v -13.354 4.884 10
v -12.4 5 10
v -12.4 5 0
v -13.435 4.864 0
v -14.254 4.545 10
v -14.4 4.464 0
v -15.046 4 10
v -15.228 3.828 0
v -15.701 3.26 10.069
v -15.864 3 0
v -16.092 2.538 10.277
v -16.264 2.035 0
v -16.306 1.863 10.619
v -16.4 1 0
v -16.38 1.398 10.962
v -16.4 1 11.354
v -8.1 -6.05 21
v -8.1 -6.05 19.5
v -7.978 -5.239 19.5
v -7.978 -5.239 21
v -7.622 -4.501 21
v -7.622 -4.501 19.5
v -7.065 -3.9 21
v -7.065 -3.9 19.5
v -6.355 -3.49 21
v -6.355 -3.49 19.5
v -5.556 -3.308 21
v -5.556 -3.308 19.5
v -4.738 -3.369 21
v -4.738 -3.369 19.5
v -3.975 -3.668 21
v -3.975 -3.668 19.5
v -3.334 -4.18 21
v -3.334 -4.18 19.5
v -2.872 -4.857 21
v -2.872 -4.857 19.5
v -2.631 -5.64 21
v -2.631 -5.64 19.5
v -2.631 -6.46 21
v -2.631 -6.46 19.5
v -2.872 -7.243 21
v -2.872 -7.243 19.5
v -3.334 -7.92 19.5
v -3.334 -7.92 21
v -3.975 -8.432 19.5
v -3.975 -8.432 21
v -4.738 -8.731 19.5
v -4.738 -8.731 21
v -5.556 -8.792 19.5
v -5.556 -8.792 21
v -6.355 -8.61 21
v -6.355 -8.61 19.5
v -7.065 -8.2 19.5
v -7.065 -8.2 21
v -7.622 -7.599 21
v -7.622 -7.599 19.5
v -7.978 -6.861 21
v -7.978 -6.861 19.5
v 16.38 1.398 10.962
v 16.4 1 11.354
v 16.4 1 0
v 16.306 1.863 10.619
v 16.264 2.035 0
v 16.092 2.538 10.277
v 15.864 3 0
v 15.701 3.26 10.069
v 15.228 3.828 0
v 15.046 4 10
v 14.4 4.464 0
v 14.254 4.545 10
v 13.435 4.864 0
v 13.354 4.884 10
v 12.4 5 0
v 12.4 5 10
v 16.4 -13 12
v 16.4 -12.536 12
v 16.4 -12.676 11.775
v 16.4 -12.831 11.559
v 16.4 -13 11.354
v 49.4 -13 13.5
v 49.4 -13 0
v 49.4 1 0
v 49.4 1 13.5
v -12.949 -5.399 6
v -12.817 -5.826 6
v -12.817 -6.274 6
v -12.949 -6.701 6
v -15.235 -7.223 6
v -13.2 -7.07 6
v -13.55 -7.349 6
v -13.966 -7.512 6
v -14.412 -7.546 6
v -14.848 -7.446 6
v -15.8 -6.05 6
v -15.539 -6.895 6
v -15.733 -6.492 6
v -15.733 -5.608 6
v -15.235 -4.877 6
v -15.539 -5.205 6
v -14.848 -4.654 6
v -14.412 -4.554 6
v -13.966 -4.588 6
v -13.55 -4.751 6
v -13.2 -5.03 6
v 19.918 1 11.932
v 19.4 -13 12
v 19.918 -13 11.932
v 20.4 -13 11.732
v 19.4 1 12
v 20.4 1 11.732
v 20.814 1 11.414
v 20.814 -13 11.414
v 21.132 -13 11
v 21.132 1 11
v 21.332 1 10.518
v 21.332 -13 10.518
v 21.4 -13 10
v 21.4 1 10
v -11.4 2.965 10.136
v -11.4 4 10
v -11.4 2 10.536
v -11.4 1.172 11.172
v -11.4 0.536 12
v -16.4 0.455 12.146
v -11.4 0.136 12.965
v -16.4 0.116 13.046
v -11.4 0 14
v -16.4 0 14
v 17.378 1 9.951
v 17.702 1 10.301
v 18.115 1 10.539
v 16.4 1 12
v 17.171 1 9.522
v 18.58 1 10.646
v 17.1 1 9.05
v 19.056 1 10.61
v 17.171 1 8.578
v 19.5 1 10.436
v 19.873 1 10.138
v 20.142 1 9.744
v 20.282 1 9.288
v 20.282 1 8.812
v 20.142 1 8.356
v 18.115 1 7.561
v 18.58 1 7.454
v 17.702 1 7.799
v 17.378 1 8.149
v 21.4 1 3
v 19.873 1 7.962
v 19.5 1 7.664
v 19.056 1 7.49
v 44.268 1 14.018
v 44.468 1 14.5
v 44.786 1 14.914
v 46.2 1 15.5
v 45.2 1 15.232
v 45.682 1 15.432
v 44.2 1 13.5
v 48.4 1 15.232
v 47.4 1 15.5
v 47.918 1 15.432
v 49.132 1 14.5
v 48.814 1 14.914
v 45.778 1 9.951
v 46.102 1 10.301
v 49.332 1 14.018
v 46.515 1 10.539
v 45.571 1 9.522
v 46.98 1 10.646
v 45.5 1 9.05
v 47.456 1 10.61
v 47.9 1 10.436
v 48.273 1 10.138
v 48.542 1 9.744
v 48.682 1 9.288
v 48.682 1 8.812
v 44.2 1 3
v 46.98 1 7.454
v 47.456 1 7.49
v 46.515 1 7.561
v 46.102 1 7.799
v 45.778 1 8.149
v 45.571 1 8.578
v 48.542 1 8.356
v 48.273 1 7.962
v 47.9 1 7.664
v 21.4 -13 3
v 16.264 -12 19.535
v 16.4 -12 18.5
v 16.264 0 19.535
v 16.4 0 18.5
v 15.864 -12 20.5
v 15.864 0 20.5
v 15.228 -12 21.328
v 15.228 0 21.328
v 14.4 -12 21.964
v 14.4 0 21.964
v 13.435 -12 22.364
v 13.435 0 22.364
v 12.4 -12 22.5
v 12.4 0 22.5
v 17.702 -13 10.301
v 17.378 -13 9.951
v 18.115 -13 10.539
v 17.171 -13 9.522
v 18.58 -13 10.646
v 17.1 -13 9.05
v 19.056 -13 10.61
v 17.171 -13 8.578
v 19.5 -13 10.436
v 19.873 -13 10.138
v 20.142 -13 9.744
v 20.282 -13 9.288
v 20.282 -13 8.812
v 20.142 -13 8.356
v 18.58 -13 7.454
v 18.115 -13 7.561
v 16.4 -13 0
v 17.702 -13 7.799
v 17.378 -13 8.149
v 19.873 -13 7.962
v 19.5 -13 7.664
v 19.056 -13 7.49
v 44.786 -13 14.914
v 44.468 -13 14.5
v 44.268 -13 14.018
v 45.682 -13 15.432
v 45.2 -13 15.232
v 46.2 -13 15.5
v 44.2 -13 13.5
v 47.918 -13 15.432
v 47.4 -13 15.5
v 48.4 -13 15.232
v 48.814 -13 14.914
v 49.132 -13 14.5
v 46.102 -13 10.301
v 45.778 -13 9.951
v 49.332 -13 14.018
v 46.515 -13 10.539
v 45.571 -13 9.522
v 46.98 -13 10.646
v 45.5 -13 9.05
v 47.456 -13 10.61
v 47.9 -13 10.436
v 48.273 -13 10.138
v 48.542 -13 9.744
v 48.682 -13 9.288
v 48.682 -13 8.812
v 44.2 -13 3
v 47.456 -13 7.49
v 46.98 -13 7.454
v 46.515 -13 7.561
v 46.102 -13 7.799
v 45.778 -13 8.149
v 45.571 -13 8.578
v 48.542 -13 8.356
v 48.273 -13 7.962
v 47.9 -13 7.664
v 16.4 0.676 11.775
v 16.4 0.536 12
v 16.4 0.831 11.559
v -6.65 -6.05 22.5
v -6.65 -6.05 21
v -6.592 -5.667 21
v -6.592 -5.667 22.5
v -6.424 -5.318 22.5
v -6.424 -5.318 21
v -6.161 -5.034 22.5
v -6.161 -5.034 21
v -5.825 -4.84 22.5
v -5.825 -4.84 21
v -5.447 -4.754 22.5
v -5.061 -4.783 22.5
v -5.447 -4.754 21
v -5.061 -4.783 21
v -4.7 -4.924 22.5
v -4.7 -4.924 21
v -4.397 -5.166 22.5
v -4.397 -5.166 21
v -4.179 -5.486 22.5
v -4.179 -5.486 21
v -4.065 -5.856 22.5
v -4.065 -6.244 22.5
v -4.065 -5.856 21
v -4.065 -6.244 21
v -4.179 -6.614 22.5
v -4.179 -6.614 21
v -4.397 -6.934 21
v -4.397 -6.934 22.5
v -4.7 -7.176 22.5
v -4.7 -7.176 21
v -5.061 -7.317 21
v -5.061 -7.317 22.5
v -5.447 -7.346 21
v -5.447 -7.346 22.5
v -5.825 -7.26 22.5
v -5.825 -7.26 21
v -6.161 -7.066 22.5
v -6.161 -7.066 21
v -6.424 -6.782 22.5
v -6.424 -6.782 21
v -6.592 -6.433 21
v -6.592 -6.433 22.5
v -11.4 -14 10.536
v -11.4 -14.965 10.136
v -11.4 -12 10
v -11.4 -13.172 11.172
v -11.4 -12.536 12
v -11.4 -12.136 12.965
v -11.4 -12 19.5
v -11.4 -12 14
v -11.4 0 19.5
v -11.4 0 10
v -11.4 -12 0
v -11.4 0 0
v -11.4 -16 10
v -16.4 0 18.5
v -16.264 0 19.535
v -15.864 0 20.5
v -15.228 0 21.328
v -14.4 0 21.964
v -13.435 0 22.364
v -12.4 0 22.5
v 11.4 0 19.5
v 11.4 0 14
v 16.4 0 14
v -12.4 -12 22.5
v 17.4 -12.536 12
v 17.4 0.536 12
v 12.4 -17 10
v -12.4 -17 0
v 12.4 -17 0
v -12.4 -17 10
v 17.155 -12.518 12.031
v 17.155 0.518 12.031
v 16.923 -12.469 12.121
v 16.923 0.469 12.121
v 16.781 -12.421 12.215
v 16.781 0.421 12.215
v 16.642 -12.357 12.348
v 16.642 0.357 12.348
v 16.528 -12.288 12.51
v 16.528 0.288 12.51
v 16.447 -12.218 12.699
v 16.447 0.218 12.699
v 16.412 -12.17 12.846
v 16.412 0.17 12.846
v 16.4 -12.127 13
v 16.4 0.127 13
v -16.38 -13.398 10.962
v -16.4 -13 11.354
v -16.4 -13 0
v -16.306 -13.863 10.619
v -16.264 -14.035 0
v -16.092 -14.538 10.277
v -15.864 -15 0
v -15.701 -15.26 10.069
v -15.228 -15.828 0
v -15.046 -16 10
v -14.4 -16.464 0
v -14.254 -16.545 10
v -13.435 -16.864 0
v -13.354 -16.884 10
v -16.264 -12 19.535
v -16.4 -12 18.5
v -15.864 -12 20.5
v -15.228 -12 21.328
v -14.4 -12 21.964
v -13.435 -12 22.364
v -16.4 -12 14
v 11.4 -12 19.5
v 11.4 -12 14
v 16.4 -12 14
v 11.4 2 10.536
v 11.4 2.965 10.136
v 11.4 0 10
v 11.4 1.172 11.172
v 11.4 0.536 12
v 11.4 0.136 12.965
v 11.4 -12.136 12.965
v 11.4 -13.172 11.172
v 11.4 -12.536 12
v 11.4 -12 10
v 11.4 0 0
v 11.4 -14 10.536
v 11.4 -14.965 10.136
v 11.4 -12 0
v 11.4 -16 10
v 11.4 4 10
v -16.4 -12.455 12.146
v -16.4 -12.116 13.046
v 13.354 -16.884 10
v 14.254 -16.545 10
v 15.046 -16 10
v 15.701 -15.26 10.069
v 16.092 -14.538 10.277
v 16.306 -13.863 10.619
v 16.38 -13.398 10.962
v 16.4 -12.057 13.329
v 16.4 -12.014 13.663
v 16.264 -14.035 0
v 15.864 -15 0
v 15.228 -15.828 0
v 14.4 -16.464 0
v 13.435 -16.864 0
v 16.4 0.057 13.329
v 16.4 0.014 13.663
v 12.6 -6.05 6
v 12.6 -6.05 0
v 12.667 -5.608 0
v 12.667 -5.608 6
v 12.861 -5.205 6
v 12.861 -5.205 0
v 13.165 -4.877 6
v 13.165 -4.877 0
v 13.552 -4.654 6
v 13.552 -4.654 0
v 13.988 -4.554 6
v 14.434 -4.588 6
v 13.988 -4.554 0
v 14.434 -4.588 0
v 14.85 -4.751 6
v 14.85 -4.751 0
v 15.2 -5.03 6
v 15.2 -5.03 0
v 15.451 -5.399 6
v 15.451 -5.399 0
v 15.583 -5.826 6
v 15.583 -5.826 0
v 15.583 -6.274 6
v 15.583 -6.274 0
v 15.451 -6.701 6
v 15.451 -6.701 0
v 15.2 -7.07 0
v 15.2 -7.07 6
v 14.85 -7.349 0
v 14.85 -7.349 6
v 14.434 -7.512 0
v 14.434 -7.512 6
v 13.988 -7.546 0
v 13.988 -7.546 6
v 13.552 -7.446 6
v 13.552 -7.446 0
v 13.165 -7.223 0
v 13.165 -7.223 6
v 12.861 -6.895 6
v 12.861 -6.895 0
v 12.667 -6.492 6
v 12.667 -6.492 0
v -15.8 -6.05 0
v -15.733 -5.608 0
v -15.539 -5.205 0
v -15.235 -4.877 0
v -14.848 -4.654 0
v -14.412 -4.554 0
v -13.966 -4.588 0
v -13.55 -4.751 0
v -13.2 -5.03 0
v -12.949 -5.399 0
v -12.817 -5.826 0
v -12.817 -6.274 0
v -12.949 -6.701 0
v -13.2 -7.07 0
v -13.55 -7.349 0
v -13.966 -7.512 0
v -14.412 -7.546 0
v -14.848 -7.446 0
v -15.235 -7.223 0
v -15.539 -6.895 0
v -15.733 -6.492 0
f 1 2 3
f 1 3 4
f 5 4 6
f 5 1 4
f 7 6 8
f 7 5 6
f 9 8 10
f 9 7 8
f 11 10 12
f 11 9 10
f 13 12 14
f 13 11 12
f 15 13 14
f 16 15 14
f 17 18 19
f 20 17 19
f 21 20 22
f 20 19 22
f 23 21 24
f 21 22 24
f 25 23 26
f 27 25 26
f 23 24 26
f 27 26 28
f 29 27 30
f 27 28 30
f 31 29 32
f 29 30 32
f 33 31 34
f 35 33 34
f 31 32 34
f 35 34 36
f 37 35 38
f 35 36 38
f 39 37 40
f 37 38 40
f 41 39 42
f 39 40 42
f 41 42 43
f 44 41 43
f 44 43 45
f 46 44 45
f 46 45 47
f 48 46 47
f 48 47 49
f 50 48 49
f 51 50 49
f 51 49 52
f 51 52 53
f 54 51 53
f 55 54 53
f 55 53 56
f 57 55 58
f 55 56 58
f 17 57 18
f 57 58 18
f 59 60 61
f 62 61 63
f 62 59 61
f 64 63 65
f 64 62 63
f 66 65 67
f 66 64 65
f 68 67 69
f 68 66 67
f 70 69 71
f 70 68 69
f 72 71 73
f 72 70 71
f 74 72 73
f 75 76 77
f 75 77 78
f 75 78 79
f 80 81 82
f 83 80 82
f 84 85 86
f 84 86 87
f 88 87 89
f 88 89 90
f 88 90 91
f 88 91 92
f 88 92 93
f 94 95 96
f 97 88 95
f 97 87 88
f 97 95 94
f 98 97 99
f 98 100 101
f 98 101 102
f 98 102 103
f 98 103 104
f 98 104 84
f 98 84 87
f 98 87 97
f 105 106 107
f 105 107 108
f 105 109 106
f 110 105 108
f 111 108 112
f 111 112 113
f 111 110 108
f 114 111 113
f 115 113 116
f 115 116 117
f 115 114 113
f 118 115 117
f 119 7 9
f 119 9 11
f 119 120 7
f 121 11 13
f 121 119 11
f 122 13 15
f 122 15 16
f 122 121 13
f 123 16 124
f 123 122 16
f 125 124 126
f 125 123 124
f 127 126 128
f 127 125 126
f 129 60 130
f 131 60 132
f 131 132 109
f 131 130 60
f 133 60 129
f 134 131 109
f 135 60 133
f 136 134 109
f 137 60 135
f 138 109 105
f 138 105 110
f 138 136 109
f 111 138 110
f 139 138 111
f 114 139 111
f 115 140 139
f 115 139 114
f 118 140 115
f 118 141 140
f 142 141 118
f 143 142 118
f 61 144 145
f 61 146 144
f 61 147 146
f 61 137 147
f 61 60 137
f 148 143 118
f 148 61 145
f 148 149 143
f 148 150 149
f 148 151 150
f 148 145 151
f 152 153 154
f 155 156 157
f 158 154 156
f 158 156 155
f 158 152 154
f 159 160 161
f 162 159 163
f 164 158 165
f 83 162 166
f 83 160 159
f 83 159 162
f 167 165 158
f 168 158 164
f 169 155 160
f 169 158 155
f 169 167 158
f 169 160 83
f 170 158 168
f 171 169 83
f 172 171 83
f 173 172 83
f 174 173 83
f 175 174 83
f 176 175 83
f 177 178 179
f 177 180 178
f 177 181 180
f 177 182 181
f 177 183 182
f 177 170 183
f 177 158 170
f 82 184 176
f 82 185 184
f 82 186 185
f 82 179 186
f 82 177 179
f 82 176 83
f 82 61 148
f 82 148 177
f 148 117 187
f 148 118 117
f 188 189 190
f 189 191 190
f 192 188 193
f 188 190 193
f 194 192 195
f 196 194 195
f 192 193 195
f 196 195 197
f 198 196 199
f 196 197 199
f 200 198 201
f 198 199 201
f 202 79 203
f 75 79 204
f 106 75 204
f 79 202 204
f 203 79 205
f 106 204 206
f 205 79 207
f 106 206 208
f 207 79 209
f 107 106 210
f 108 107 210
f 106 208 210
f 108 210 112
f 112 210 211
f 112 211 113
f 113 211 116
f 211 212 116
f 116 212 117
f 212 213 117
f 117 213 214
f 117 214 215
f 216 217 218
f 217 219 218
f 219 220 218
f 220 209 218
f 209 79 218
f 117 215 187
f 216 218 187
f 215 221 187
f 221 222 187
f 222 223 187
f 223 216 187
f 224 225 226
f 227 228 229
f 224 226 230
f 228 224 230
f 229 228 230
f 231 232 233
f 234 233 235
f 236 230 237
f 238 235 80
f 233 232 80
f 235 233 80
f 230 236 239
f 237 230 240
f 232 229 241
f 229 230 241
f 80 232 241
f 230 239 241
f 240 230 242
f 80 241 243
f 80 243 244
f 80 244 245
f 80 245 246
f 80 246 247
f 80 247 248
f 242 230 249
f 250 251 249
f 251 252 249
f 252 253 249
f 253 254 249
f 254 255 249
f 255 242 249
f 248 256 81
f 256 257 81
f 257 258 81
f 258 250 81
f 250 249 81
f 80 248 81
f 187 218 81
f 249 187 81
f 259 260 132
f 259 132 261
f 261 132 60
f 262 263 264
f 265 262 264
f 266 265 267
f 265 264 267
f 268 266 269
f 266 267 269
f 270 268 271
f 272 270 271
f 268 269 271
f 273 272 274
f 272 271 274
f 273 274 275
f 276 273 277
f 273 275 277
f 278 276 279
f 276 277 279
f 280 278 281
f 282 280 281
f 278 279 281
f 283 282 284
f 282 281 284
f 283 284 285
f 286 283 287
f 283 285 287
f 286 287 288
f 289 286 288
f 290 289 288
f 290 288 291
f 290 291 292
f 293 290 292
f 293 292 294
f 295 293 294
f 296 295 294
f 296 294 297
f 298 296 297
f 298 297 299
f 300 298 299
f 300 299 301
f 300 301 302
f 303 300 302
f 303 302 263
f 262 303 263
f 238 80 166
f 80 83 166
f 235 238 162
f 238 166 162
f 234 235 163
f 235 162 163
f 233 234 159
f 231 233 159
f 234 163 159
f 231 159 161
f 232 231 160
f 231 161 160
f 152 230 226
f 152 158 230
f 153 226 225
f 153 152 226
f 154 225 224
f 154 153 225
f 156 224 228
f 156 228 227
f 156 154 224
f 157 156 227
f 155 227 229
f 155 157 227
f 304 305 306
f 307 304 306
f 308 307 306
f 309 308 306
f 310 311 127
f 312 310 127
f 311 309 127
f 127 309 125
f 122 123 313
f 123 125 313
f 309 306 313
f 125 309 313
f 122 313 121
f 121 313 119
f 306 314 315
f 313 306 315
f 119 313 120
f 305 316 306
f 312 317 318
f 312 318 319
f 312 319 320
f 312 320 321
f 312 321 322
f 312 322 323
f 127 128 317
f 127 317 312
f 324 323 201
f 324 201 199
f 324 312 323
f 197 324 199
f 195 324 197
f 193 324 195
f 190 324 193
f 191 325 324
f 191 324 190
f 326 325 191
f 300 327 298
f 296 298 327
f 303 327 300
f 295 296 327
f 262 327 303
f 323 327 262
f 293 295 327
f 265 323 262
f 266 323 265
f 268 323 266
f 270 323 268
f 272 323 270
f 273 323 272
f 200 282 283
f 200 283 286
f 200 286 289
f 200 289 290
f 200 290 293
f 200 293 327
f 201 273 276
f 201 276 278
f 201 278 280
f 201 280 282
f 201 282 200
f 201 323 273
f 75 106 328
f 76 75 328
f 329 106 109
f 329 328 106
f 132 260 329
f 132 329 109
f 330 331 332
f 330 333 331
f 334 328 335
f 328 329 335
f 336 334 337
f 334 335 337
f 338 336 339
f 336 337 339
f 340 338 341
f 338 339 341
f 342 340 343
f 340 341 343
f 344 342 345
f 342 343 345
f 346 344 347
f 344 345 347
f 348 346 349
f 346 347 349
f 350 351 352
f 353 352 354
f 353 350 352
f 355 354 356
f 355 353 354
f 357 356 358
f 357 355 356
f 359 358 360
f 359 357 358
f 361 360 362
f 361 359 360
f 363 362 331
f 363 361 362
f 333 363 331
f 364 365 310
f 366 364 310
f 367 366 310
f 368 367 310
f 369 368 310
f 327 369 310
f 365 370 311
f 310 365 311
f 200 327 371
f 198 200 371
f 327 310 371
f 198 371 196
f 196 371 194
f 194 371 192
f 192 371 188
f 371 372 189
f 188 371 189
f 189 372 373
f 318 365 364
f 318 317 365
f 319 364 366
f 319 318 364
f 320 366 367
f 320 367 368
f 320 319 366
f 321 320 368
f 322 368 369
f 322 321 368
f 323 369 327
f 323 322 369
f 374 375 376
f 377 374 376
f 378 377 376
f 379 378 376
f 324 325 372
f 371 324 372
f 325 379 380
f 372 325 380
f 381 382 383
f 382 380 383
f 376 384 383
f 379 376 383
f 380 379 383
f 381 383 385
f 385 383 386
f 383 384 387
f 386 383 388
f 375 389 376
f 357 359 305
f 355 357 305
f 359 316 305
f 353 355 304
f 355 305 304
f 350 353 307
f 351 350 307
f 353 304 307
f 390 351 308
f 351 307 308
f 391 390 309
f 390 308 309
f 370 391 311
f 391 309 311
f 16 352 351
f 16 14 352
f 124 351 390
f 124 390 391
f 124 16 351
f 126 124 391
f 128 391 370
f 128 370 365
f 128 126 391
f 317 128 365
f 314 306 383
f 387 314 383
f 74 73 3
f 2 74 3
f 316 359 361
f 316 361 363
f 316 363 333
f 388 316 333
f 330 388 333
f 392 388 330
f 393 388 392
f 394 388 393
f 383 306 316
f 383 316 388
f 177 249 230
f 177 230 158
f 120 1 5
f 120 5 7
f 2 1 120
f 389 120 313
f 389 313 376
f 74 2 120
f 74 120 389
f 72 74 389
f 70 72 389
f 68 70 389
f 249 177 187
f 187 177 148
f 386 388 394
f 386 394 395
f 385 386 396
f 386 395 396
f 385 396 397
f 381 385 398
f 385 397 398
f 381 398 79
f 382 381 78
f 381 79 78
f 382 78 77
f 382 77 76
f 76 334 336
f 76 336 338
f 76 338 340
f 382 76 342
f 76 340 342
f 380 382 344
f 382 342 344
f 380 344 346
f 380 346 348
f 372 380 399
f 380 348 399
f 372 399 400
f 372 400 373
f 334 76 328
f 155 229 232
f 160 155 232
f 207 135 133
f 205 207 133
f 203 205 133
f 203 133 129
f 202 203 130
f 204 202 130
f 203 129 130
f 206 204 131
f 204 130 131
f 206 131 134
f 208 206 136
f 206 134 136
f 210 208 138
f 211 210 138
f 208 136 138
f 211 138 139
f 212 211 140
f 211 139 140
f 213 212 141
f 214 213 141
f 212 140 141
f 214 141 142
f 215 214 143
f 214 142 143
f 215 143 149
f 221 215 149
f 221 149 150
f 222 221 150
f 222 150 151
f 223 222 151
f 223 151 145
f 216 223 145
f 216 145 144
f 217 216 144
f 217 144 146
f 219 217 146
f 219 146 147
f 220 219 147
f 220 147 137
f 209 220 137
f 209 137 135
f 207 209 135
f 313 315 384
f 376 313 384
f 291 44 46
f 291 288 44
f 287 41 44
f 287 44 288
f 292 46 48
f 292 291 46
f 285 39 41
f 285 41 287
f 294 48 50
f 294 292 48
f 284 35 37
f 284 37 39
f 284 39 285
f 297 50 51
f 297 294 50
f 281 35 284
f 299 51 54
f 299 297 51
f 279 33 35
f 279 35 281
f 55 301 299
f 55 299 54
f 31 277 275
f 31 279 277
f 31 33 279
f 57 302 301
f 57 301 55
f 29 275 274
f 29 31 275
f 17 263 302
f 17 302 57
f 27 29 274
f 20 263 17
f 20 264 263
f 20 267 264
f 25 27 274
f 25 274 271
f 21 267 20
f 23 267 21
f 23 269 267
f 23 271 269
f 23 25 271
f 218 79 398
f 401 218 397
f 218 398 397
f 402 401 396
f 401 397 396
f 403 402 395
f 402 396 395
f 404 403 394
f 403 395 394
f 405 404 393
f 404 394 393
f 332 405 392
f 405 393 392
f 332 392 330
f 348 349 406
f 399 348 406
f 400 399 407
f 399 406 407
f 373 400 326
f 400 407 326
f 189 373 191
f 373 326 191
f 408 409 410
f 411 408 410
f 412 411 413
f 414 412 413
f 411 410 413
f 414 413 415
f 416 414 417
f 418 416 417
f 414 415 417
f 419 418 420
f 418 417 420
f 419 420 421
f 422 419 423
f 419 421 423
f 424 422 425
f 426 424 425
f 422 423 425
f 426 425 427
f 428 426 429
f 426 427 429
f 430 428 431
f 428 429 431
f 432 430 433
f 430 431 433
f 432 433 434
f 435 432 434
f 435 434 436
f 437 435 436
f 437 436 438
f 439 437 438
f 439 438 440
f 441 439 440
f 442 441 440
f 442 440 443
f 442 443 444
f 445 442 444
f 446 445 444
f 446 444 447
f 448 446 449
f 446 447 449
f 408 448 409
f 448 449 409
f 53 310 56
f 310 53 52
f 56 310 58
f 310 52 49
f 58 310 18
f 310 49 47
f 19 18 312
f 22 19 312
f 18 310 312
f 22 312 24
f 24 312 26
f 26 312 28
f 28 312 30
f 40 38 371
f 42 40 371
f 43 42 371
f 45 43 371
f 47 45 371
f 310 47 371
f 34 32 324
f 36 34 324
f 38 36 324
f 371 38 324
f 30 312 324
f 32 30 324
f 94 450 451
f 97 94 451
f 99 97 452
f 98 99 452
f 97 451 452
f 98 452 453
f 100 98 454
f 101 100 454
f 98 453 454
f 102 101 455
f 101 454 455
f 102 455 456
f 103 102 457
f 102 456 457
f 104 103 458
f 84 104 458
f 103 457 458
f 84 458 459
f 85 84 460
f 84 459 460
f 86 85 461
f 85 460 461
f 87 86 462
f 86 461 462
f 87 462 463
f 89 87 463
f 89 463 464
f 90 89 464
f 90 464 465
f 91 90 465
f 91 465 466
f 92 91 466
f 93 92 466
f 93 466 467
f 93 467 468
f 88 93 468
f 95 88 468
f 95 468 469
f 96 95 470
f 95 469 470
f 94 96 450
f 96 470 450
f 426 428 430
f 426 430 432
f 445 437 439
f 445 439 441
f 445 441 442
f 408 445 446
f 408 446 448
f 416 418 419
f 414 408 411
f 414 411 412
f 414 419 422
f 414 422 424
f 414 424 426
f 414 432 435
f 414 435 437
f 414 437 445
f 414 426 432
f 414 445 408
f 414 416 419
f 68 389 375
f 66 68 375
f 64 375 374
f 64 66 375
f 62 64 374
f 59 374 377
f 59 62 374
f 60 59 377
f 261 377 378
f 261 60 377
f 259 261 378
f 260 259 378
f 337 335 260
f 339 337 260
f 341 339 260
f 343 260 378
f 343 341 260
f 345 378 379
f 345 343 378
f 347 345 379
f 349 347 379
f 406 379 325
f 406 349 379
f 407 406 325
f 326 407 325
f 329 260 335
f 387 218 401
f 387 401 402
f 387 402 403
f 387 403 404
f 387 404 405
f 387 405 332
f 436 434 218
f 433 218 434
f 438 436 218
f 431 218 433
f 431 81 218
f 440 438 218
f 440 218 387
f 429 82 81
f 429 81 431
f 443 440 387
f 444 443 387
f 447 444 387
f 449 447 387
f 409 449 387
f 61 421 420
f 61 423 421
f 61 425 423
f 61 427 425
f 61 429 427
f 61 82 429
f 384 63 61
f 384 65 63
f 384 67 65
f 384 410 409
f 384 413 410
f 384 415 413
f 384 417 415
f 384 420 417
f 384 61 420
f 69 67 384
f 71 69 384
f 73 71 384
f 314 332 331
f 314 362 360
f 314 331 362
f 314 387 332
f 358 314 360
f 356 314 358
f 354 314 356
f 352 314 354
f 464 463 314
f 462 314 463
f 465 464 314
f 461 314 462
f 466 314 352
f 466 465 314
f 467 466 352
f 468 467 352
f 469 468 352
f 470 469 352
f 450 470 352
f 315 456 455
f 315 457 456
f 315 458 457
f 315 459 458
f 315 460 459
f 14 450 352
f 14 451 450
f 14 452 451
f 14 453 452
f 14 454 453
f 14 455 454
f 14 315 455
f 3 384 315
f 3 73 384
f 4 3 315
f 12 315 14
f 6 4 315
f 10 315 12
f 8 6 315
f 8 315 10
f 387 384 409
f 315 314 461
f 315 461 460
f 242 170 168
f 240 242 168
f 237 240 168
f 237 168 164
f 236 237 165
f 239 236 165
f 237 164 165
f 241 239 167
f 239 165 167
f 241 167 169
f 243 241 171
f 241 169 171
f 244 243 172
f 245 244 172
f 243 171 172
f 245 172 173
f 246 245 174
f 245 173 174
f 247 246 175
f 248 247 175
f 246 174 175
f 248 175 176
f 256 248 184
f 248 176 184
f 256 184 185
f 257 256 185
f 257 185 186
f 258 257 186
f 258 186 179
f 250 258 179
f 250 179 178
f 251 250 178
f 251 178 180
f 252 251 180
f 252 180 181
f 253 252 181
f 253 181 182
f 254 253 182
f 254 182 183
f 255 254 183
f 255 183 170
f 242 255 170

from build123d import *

# Parameters (mm, degrees)
EXTRUDE_THIN1_DEPTH = 10
FILLET1_R           = 4
SKETCH2_W           = 5
SKETCH2_H           = 12
BOSS_EXTRUDE1_DEPTH = 9.5
SKETCH3_W           = 32.8
SKETCH3_H           = 12
BOSS_EXTRUDE2_DEPTH = 3
FILLET2_R           = 4
SKETCH4_R           = 1.3
CUT_EXTRUDE1_DEPTH  = 3
SKETCH5_R           = 1.5
CUT_EXTRUDE2_DEPTH  = 6
SKETCH6_W           = 32.8
SKETCH6_H           = 10
BOSS_EXTRUDE3_DEPTH = 5
FILLET3_R           = 4
FILLET4_R           = 4
SKETCH7_R           = 2.75
CUT_EXTRUDE3_DEPTH  = 1.5
SKETCH9_W           = 9
SKETCH9_H           = 14
BOSS_EXTRUDE5_DEPTH = 5
FILLET10_R          = 1
SKETCH12_W          = 33
SKETCH12_H          = 14
BOSS_EXTRUDE7_DEPTH = 3
SKETCH13_W          = 5.2
SKETCH13_H          = 14
BOSS_EXTRUDE8_DEPTH = 12.5
FILLET11_R          = 2
FILLET13_R          = 2
SKETCH14_R          = 1.6
CUT_EXTRUDE4_DEPTH  = 58.189247273


with BuildPart() as part:
    # Sketch1 → Extrude-Thin1 (new body)
    with BuildSketch(Plane.XY):
        Polygon((-11.4, -12), (-11.4, 0), (11.4, 0), (11.4, -12), (16.4, -12), (16.4, 5), (-16.4, 5), (-16.4, -12), align=None)
    extrude(amount=EXTRUDE_THIN1_DEPTH)

    # Fillet1
    fillet1_edges = [part.edges().sort_by_distance(p)[0] for p in [
        (-16.4, 5, 5),
        (16.4, 5, 5),
    ]]
    fillet(fillet1_edges, radius=FILLET1_R)

    # Sketch2 → Boss-Extrude1 (add)
    with BuildSketch(Plane.XY.offset(10)):
        with Locations((-13.9, -6)):
            Rectangle(SKETCH2_W, SKETCH2_H)
        with Locations((13.9, -6)):
            Rectangle(SKETCH2_W, SKETCH2_H)
    extrude(amount=BOSS_EXTRUDE1_DEPTH)

    # Sketch3 → Boss-Extrude2 (add)
    with BuildSketch(Plane.XY.offset(19.5)):
        with Locations((0, -6)):
            Rectangle(SKETCH3_W, SKETCH3_H)
    extrude(amount=BOSS_EXTRUDE2_DEPTH)

    # Fillet2
    fillet2_edges = [part.edges().sort_by_distance(p)[0] for p in [
        (13.9, 0, 10),
        (-13.9, 0, 10),
        (16.4, -6, 22.5),
        (-16.4, -6, 22.5),
    ]]
    fillet(fillet2_edges, radius=FILLET2_R)

    # Sketch4 → Cut-Extrude1 (cut)
    with BuildSketch(Plane(origin=(0, 0, 19.5), x_dir=(-1, 0, 0), z_dir=(0, 0, -1))):
        with Locations((5.35, -6.05)):
            Circle(SKETCH4_R)
    extrude(amount=-CUT_EXTRUDE1_DEPTH, mode=Mode.SUBTRACT)

    # Sketch5 → Cut-Extrude2 (cut)
    with BuildSketch(Plane(origin=(0, 0, 0), x_dir=(-1, 0, 0), z_dir=(0, 0, -1))):
        with Locations((14.3, -6.05)):
            Circle(SKETCH5_R)
        with Locations((-14.1, -6.05)):
            Circle(SKETCH5_R)
    extrude(amount=-CUT_EXTRUDE2_DEPTH, mode=Mode.SUBTRACT)

    # Sketch6 → Boss-Extrude3 (add)
    with BuildSketch(Plane.XZ.offset(12)):
        with Locations((0, 5)):
            Rectangle(SKETCH6_W, SKETCH6_H)
    extrude(amount=BOSS_EXTRUDE3_DEPTH)

    # Fillet3
    fillet3_edges = [part.edges().sort_by_distance(p)[0] for p in [
        (16.4, -17, 5),
        (-16.4, -17, 5),
    ]]
    fillet(fillet3_edges, radius=FILLET3_R)

    # Fillet4
    fillet4_edges = [part.edges().sort_by_distance(p)[0] for p in [
        (13.9, -12, 10),
        (-13.9, -12, 10),
    ]]
    fillet(fillet4_edges, radius=FILLET4_R)

    # Sketch7 → Cut-Extrude3 (cut)
    with BuildSketch(Plane(origin=(0, 0, 19.5), x_dir=(-1, 0, 0), z_dir=(0, 0, -1))):
        with Locations((5.35, -6.05)):
            Circle(SKETCH7_R)
    extrude(amount=-CUT_EXTRUDE3_DEPTH, mode=Mode.SUBTRACT)

    # Sketch9 → Boss-Extrude5 (add)
    with BuildSketch(Plane(origin=(16.4, 0, 0), x_dir=(0, 0, -1), z_dir=(1, 0, 0))):
        with Locations((-7.5, -6)):
            Rectangle(SKETCH9_W, SKETCH9_H)
    extrude(amount=BOSS_EXTRUDE5_DEPTH)

    # Fillet10
    fillet10_edges = [part.edges().sort_by_distance(p)[0] for p in [
        (16.4, -6, 12),
    ]]
    fillet(fillet10_edges, radius=FILLET10_R)

    # Sketch12 → Boss-Extrude7 (add)
    with BuildSketch(Plane(origin=(0, 0, 0), x_dir=(-1, 0, 0), z_dir=(0, 0, -1))):
        with Locations((-32.9, -6)):
            Rectangle(SKETCH12_W, SKETCH12_H)
    extrude(amount=-BOSS_EXTRUDE7_DEPTH)

    # Sketch13 → Boss-Extrude8 (add)
    with BuildSketch(Plane.XY.offset(3)):
        with Locations((46.8, -6)):
            Rectangle(SKETCH13_W, SKETCH13_H)
    extrude(amount=BOSS_EXTRUDE8_DEPTH)

    # Fillet11
    fillet11_edges = [part.edges().sort_by_distance(p)[0] for p in [
        (21.4, -6, 12),
    ]]
    fillet(fillet11_edges, radius=FILLET11_R)

    # Fillet13
    fillet13_edges = [part.edges().sort_by_distance(p)[0] for p in [
        (49.4, -6, 15.5),
        (44.2, -6, 15.5),
    ]]
    fillet(fillet13_edges, radius=FILLET13_R)

    # Sketch14 → Cut-Extrude4 (cut, through all)
    with BuildSketch(Plane(origin=(0, 1, 0), x_dir=(1, 0, 0), z_dir=(0, 1, 0))):
        with Locations(Location((18.7, -9.05, 0), (0, 0, 180))):
            Circle(SKETCH14_R)
        with Locations(Location((47.1, -9.05, 0), (0, 0, 180))):
            Circle(SKETCH14_R)
    extrude(amount=-CUT_EXTRUDE4_DEPTH, mode=Mode.SUBTRACT)


solid = part.part
